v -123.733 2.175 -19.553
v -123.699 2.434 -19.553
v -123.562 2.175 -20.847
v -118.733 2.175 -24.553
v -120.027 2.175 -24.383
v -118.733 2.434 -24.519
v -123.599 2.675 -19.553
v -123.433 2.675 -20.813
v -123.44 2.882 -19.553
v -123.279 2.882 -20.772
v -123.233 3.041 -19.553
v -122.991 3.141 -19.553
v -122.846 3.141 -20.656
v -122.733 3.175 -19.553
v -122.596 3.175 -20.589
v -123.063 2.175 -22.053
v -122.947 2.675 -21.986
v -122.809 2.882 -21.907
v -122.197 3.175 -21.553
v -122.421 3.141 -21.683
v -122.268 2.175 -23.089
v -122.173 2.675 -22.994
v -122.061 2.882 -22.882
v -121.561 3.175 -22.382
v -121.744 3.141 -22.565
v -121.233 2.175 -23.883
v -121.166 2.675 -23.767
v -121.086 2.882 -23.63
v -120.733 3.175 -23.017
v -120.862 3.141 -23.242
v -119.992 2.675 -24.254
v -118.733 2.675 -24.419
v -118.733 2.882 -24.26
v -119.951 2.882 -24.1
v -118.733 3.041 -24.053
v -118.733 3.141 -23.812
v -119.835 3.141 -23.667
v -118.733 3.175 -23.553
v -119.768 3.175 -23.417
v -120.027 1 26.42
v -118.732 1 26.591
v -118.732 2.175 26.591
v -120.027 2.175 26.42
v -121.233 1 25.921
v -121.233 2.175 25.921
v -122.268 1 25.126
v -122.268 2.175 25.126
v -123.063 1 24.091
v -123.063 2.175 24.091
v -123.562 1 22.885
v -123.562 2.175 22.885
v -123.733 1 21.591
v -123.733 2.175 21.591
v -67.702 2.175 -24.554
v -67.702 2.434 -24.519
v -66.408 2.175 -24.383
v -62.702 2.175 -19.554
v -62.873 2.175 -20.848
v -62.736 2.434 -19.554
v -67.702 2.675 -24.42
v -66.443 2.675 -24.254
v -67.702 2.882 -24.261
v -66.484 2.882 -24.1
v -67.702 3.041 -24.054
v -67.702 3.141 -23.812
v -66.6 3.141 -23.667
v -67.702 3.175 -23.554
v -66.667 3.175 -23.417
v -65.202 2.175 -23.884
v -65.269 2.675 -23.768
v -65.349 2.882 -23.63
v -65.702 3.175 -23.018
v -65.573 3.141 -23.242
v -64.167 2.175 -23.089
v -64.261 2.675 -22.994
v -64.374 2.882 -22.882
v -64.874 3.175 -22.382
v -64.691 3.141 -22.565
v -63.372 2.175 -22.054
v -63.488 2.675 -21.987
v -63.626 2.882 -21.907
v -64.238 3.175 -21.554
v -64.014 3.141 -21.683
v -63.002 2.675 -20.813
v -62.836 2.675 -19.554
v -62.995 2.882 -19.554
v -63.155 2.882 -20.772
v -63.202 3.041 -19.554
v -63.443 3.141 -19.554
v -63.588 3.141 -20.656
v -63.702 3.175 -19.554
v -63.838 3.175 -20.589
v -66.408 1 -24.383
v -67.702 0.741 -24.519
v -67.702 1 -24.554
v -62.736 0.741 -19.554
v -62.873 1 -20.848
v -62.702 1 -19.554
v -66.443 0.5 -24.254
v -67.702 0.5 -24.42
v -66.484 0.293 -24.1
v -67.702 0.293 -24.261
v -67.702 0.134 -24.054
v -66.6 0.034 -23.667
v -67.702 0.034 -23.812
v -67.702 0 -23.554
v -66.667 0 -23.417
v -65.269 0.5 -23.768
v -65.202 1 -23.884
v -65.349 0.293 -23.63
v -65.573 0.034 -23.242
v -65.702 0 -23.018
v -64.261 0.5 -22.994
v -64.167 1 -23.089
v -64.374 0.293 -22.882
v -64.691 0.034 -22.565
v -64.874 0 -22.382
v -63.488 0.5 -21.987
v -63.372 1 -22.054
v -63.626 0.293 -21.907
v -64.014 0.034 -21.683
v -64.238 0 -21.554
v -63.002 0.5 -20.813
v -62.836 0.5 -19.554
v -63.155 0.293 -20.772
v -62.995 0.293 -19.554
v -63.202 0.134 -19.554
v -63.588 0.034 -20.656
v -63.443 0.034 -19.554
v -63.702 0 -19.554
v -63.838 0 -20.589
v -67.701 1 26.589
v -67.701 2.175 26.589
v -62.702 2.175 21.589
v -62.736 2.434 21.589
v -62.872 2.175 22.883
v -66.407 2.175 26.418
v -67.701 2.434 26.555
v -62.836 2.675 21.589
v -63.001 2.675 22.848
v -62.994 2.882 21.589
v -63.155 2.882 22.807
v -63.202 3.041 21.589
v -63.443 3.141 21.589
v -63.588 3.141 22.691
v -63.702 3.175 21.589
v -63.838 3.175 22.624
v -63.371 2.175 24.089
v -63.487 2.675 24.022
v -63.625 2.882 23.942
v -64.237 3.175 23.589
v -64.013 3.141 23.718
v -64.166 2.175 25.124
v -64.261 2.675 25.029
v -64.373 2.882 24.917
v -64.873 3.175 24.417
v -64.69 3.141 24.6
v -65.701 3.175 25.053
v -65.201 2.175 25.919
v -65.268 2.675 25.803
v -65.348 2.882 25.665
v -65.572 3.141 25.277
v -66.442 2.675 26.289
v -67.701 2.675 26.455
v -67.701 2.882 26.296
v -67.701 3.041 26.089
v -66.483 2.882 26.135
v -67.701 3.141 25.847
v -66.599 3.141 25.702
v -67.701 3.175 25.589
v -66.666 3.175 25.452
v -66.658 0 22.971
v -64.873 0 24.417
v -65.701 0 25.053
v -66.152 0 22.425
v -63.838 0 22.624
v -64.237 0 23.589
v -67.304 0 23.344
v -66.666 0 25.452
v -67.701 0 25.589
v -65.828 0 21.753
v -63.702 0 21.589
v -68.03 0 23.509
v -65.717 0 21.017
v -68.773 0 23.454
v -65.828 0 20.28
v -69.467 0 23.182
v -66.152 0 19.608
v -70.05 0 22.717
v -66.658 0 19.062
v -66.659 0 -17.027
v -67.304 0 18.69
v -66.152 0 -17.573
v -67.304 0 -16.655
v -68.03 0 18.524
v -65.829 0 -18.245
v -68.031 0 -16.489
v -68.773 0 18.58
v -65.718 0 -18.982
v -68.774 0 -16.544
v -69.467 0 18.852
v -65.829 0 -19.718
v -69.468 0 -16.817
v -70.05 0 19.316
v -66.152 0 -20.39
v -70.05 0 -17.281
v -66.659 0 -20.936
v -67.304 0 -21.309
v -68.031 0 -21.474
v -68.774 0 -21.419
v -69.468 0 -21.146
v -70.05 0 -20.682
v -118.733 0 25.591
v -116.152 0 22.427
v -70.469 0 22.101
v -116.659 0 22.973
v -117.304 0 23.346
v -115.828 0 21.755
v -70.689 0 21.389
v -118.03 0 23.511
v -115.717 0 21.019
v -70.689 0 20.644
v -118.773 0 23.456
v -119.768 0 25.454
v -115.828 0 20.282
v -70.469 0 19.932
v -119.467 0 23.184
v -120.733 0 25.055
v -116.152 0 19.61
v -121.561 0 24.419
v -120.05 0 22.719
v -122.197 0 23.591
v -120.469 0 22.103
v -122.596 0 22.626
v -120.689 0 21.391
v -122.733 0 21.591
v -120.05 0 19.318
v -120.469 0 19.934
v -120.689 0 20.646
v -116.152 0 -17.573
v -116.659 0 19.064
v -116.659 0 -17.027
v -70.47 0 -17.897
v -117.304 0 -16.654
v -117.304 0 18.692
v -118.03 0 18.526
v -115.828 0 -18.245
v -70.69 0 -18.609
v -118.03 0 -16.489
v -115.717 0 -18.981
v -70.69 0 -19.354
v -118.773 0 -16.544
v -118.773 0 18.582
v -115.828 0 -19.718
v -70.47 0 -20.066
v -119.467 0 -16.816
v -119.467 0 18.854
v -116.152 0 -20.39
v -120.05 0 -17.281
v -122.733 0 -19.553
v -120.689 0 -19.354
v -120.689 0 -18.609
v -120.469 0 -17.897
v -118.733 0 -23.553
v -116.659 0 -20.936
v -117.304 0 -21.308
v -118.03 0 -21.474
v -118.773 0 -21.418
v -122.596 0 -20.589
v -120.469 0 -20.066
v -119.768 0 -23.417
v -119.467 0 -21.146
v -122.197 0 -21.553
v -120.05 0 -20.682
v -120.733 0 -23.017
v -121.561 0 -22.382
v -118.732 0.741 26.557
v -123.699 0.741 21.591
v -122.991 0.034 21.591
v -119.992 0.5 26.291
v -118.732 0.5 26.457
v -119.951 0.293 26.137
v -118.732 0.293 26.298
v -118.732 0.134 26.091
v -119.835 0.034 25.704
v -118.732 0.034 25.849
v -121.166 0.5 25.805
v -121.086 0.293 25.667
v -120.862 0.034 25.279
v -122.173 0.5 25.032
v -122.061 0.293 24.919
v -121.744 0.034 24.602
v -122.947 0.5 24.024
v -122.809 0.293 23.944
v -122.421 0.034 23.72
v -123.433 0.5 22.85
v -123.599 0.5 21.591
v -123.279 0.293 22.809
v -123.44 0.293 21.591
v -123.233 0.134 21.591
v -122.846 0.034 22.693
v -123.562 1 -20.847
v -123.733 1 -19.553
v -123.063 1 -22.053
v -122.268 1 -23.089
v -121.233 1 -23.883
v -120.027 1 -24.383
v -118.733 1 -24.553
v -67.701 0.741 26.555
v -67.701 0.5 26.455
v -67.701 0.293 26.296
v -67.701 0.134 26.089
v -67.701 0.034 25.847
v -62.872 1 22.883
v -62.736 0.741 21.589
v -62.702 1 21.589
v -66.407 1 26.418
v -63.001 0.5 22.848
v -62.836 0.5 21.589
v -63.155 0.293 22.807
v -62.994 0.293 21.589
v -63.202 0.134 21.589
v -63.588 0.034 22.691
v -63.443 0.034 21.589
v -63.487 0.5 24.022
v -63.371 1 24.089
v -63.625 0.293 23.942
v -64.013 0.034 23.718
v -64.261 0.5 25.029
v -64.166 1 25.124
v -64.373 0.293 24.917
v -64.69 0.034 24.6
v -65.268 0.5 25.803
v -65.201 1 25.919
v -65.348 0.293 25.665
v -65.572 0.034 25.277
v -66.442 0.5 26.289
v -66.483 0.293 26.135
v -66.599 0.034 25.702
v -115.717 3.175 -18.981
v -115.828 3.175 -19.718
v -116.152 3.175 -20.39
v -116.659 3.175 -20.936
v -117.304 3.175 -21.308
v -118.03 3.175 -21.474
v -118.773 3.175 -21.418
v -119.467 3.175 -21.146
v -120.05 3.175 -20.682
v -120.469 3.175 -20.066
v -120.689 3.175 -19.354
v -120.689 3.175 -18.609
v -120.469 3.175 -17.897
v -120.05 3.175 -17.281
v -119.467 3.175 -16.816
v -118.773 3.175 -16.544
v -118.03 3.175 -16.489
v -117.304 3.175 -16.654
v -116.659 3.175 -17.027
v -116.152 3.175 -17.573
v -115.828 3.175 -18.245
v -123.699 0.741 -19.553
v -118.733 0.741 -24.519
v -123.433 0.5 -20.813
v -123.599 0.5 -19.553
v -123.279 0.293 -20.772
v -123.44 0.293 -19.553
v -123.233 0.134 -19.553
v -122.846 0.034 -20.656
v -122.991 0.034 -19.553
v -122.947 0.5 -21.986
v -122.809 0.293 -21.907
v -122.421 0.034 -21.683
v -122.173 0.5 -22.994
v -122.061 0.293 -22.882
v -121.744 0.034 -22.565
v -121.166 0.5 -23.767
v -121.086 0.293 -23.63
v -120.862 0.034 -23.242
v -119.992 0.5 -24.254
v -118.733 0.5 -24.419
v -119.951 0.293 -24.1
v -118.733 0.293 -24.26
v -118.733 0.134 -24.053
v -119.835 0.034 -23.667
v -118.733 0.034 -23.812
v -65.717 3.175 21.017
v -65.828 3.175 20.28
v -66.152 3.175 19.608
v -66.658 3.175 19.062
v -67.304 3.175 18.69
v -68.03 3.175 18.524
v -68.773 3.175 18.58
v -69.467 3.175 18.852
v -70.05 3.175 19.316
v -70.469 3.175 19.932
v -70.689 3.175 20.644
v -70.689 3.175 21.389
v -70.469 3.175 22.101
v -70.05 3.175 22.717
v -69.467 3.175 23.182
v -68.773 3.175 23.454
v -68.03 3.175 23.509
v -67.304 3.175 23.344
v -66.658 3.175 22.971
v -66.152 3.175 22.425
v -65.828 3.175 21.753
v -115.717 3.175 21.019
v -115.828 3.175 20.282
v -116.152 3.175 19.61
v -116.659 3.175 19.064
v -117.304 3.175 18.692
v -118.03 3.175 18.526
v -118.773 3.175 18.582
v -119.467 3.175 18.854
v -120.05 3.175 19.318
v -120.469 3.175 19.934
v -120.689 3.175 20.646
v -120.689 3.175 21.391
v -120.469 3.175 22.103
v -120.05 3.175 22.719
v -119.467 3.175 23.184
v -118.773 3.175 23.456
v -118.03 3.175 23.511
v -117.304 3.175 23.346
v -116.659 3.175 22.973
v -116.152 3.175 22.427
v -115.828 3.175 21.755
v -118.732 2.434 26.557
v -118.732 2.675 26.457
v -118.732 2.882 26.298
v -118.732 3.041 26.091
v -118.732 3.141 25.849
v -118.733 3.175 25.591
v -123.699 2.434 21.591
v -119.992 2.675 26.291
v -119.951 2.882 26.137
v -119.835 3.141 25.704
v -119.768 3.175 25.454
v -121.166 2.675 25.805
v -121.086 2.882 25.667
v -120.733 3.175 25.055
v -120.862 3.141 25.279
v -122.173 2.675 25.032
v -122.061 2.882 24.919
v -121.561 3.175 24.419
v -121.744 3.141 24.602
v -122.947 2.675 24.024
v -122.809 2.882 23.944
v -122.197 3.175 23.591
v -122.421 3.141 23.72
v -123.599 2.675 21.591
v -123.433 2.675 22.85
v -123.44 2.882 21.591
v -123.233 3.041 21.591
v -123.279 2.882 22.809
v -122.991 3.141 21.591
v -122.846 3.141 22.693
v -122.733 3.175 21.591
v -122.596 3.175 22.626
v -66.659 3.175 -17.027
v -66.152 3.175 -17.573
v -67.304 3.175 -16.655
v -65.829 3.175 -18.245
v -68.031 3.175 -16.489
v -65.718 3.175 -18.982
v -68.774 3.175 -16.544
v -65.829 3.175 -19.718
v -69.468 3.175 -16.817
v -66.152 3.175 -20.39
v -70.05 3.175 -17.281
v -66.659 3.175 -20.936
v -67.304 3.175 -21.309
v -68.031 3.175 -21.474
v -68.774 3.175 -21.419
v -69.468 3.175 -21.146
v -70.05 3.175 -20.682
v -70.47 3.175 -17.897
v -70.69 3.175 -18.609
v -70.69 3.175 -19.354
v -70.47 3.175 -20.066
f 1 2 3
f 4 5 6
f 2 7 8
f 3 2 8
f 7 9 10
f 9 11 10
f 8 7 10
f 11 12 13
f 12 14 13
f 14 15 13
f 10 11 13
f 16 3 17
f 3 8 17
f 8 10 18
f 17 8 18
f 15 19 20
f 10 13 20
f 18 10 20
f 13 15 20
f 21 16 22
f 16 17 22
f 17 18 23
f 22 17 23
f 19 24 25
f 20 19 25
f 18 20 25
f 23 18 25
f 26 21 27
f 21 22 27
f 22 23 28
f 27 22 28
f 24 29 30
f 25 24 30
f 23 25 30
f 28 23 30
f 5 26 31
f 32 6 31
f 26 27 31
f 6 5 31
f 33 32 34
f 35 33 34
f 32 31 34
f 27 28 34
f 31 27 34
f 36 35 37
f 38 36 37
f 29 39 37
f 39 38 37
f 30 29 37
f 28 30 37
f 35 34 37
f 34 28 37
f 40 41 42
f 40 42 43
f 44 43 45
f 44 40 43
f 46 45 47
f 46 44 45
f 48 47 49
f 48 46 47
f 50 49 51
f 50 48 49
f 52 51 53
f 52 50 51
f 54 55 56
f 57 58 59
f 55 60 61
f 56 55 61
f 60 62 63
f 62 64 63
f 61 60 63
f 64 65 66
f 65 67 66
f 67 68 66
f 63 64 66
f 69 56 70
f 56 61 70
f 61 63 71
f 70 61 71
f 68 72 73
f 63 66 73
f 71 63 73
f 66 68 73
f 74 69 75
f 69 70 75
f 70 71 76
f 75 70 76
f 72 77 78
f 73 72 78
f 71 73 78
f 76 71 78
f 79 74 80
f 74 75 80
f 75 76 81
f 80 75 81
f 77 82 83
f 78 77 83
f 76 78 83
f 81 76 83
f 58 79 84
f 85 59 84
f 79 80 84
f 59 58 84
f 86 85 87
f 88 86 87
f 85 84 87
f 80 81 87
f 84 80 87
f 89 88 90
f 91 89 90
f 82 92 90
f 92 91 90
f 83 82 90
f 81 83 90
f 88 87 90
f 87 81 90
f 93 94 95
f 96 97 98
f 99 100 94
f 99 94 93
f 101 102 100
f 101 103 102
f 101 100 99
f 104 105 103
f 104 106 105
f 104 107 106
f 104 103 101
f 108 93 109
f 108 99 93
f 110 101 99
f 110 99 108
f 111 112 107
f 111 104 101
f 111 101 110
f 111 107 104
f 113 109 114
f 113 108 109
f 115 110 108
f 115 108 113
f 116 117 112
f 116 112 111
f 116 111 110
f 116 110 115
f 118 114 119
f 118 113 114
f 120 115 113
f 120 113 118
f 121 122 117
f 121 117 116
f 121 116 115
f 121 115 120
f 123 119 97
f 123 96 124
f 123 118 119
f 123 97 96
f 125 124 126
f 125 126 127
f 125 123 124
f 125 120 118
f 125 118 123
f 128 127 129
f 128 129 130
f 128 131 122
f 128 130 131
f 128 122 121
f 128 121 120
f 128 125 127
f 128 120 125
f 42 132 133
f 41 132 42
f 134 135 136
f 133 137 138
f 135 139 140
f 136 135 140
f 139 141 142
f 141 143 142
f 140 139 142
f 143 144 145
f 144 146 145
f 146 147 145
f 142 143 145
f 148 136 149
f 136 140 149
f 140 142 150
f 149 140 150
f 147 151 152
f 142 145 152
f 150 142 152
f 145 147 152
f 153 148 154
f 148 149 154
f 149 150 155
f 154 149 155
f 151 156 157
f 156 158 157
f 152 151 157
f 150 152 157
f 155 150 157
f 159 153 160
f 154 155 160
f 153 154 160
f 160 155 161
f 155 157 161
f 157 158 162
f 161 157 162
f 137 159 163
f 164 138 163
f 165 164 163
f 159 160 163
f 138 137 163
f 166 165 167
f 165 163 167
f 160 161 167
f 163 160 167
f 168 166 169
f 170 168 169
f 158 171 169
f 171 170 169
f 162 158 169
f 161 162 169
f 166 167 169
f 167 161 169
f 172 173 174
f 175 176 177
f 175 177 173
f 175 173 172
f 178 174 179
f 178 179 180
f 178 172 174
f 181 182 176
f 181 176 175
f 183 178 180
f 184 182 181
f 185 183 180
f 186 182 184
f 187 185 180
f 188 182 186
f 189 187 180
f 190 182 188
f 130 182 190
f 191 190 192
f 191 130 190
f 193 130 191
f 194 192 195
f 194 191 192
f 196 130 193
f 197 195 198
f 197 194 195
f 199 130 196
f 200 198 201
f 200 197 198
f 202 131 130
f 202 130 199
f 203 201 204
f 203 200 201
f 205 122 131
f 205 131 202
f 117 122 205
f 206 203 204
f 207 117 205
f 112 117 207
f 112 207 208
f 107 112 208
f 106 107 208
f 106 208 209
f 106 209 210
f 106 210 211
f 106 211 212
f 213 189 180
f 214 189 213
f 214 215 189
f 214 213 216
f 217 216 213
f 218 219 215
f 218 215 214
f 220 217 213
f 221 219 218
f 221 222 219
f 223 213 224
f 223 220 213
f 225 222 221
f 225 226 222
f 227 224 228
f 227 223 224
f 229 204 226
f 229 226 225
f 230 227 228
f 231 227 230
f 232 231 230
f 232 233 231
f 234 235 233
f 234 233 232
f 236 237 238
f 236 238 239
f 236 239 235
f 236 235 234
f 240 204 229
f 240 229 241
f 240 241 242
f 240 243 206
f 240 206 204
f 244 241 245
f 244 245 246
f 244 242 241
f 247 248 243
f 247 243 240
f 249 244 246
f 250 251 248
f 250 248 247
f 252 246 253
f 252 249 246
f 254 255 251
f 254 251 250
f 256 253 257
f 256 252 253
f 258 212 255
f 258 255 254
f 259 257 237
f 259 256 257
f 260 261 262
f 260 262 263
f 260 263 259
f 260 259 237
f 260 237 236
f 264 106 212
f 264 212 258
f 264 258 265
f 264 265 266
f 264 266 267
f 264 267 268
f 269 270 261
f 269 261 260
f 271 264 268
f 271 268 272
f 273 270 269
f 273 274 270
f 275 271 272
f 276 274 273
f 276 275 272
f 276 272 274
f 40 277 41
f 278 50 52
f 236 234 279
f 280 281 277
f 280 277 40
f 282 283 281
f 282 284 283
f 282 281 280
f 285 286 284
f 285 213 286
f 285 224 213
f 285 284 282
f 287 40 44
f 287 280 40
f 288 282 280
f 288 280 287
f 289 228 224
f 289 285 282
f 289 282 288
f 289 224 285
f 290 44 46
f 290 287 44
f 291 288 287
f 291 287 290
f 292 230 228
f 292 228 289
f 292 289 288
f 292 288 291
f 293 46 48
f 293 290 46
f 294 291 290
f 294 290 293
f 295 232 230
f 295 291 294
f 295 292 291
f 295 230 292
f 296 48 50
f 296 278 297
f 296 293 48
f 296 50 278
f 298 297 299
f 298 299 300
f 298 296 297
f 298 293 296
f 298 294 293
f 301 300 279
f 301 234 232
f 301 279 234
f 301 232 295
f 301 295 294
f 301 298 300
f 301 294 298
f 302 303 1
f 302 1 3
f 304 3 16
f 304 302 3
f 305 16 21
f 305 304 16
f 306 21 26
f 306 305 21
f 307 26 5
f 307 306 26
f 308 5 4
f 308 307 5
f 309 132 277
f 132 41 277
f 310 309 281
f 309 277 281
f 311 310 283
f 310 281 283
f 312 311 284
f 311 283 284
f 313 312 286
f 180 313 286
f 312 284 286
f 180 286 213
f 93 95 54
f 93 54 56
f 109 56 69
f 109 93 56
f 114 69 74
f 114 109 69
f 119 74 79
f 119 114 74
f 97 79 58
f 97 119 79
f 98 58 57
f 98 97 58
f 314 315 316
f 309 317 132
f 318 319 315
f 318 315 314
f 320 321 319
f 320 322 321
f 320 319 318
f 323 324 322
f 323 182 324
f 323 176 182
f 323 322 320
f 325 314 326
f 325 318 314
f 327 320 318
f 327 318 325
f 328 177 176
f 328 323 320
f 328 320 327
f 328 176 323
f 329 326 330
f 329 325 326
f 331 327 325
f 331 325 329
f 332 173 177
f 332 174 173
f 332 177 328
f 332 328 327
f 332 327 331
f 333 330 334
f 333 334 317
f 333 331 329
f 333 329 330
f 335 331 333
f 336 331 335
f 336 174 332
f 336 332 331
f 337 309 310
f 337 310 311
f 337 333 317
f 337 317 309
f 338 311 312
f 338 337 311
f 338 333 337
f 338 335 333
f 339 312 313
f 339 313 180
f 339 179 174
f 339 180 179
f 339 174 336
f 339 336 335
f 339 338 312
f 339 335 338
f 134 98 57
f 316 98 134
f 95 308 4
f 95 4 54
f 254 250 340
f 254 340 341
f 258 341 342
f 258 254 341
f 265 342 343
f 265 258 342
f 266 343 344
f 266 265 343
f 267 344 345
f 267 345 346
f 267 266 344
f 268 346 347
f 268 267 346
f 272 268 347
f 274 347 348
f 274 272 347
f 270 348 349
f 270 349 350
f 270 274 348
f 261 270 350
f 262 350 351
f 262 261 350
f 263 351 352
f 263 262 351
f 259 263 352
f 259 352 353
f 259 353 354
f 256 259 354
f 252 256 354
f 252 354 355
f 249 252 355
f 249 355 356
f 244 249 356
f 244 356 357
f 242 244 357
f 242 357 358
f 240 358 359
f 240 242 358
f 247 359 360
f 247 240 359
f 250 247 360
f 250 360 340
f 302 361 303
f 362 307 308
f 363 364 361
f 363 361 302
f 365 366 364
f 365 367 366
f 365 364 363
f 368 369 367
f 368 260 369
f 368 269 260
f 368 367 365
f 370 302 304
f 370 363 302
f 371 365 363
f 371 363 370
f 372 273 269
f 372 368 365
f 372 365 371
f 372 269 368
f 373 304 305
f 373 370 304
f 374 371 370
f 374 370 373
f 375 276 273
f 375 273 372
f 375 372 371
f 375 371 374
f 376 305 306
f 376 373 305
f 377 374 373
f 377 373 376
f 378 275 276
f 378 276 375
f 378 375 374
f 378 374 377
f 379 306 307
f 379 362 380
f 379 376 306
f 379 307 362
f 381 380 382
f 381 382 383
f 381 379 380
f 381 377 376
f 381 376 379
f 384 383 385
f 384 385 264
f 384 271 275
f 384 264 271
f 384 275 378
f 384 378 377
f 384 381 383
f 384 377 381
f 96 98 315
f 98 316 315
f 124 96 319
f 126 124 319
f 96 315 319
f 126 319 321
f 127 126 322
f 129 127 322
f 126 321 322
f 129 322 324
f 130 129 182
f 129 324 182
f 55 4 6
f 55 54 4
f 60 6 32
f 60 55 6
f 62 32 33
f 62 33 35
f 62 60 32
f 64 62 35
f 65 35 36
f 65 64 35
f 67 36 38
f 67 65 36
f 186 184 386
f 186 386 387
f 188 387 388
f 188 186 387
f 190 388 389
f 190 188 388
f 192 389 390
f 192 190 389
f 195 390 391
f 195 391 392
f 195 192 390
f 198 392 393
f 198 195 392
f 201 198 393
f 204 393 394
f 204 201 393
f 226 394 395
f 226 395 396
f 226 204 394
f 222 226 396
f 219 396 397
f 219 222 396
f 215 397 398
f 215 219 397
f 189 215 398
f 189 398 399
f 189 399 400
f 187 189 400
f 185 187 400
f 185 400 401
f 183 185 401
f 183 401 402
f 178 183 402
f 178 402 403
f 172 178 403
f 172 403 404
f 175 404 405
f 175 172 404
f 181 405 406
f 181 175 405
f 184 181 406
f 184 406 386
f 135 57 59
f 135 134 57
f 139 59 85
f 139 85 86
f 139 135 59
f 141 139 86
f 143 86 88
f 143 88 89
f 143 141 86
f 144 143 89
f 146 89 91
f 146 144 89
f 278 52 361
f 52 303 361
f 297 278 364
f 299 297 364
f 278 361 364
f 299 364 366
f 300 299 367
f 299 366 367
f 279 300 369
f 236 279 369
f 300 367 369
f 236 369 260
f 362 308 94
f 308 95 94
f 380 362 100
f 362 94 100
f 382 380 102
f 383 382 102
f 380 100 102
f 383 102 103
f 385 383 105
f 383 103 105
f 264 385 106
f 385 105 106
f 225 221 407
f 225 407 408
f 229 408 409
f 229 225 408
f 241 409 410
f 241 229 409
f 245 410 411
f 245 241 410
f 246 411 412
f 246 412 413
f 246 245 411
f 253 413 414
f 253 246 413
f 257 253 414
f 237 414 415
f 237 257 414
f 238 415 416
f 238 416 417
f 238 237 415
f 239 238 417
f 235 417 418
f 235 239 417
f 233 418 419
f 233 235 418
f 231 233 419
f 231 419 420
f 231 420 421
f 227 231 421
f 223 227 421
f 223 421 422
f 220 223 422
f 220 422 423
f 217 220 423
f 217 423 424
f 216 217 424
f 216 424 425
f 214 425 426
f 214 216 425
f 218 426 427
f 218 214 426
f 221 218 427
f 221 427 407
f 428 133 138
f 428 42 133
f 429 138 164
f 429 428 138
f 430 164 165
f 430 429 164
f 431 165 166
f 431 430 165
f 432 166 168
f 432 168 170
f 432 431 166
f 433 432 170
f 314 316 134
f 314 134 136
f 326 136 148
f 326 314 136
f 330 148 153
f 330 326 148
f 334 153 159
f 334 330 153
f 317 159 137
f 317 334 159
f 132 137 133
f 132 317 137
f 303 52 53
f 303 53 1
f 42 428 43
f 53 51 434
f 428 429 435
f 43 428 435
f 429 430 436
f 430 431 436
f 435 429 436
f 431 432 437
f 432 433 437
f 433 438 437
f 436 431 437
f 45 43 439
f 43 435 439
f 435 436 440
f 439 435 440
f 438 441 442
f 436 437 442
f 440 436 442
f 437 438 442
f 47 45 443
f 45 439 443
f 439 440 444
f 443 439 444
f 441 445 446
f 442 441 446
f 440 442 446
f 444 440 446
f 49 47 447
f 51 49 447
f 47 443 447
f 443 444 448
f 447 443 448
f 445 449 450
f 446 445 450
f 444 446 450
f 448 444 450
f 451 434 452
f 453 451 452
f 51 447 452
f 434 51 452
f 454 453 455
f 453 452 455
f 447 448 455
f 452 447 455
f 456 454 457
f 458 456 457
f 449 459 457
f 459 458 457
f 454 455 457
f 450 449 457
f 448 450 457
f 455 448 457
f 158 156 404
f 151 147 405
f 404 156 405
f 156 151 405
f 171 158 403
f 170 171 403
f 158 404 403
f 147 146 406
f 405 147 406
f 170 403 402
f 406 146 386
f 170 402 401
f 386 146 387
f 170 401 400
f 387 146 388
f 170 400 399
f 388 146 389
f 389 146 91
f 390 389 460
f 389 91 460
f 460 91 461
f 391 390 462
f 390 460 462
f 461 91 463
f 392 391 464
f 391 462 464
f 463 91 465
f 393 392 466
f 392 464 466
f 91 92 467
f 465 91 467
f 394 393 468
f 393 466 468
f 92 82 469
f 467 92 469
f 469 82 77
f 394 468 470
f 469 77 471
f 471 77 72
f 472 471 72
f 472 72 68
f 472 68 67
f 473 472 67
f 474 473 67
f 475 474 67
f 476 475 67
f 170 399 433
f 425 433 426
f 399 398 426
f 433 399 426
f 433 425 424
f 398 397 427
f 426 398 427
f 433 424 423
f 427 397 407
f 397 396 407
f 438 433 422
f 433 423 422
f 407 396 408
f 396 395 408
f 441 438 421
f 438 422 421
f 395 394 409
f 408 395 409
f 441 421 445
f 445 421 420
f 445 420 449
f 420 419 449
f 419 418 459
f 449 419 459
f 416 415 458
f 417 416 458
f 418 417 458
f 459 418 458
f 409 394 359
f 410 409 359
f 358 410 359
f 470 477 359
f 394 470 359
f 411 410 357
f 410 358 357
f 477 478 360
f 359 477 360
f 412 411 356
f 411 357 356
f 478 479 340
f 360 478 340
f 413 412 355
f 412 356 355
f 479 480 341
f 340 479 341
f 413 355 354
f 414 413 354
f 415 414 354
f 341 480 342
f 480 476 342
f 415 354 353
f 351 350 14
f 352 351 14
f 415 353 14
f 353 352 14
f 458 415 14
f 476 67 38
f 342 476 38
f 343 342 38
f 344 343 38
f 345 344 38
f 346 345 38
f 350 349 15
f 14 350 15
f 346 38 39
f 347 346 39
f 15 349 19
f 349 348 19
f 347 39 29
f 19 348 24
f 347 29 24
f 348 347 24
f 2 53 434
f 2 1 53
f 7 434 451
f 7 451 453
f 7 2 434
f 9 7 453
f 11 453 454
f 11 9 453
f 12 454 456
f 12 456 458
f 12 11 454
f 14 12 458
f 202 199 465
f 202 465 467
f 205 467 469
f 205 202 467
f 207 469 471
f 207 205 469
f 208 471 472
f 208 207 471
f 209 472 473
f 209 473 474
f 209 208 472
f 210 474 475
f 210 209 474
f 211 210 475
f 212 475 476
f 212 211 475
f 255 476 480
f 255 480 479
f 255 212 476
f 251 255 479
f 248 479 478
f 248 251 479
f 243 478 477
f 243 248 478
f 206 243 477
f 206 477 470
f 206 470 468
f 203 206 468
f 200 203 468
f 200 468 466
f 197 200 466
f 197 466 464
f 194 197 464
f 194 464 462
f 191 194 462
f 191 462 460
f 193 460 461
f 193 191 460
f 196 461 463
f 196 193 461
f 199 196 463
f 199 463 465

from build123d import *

# Parameters (mm, degrees)
SKETCH1_R           = 2.499798637
BOSS_EXTRUDE1_DEPTH = 3.175
FILLET1_R           = 1


with BuildPart() as part:
    # Sketch1 → Boss-Extrude1 (new body)
    with BuildSketch(Plane(origin=(0, 0, 0), x_dir=(1, 0, 0), z_dir=(0, 1, 0))):
        with BuildLine():
            Line((-67.701379439, -26.588630041), (-118.732469461, -26.59066957))
            ThreePointArc((-118.732469461, -26.59066957), (-122.268132547, -25.126274131), (-123.732669293, -21.590669574))
            Line((-123.732669293, -21.590669574), (-123.732669293, 19.553345865))
            ThreePointArc((-123.732669293, 19.553345865), (-122.268209036, 23.088873934), (-118.732685802, 24.553345865))
            Line((-118.732685802, 24.553345865), (-67.702190036, 24.553514364))
            ThreePointArc((-67.702190036, 24.553514364), (-64.166670991, 23.08907964), (-62.702173527, 19.553586583))
            Line((-62.702173527, 19.553586583), (-62.701579271, -21.588557825))
            ThreePointArc((-62.701579271, -21.588557825), (-64.165949181, -25.124067765), (-67.701379439, -26.588630041))
        make_face()
        with Locations((-118.217169293, 18.981347567)):
            Circle(SKETCH1_R, mode=Mode.SUBTRACT)
        with Locations((-68.217665265, 18.981512662)):
            Circle(SKETCH1_R, mode=Mode.SUBTRACT)
        with Locations((-68.217087532, -21.016650648)):
            Circle(SKETCH1_R, mode=Mode.SUBTRACT)
        with Locations((-118.217169293, -21.018648971)):
            Circle(SKETCH1_R, mode=Mode.SUBTRACT)
    extrude(amount=BOSS_EXTRUDE1_DEPTH)

    # Fillet1
    fillet1_edges = [part.edges().sort_by_distance(p)[0] for p in [
        (-122.268132547, 3.175, 25.126274131),
        (-123.732669293, 0, 1.018661855),
        (-122.268209036, 0, -23.088873934),
        (-93.21692445, 3.175, 26.589649806),
        (-64.165949181, 3.175, 25.124067765),
        (-62.701876399, 3.175, 1.017485621),
        (-64.166670991, 3.175, -23.08907964),
        (-93.217437919, 3.175, -24.553430114),
        (-122.268209036, 3.175, -23.088873934),
        (-123.732669293, 3.175, 1.018661855),
        (-93.217437919, 0, -24.553430114),
        (-64.166670991, 0, -23.08907964),
        (-62.701876399, 0, 1.017485621),
        (-64.165949181, 0, 25.124067765),
        (-93.21692445, 0, 26.589649806),
        (-122.268132547, 0, 25.126274131),
    ]]
    fillet(fillet1_edges, radius=FILLET1_R)


solid = part.part
